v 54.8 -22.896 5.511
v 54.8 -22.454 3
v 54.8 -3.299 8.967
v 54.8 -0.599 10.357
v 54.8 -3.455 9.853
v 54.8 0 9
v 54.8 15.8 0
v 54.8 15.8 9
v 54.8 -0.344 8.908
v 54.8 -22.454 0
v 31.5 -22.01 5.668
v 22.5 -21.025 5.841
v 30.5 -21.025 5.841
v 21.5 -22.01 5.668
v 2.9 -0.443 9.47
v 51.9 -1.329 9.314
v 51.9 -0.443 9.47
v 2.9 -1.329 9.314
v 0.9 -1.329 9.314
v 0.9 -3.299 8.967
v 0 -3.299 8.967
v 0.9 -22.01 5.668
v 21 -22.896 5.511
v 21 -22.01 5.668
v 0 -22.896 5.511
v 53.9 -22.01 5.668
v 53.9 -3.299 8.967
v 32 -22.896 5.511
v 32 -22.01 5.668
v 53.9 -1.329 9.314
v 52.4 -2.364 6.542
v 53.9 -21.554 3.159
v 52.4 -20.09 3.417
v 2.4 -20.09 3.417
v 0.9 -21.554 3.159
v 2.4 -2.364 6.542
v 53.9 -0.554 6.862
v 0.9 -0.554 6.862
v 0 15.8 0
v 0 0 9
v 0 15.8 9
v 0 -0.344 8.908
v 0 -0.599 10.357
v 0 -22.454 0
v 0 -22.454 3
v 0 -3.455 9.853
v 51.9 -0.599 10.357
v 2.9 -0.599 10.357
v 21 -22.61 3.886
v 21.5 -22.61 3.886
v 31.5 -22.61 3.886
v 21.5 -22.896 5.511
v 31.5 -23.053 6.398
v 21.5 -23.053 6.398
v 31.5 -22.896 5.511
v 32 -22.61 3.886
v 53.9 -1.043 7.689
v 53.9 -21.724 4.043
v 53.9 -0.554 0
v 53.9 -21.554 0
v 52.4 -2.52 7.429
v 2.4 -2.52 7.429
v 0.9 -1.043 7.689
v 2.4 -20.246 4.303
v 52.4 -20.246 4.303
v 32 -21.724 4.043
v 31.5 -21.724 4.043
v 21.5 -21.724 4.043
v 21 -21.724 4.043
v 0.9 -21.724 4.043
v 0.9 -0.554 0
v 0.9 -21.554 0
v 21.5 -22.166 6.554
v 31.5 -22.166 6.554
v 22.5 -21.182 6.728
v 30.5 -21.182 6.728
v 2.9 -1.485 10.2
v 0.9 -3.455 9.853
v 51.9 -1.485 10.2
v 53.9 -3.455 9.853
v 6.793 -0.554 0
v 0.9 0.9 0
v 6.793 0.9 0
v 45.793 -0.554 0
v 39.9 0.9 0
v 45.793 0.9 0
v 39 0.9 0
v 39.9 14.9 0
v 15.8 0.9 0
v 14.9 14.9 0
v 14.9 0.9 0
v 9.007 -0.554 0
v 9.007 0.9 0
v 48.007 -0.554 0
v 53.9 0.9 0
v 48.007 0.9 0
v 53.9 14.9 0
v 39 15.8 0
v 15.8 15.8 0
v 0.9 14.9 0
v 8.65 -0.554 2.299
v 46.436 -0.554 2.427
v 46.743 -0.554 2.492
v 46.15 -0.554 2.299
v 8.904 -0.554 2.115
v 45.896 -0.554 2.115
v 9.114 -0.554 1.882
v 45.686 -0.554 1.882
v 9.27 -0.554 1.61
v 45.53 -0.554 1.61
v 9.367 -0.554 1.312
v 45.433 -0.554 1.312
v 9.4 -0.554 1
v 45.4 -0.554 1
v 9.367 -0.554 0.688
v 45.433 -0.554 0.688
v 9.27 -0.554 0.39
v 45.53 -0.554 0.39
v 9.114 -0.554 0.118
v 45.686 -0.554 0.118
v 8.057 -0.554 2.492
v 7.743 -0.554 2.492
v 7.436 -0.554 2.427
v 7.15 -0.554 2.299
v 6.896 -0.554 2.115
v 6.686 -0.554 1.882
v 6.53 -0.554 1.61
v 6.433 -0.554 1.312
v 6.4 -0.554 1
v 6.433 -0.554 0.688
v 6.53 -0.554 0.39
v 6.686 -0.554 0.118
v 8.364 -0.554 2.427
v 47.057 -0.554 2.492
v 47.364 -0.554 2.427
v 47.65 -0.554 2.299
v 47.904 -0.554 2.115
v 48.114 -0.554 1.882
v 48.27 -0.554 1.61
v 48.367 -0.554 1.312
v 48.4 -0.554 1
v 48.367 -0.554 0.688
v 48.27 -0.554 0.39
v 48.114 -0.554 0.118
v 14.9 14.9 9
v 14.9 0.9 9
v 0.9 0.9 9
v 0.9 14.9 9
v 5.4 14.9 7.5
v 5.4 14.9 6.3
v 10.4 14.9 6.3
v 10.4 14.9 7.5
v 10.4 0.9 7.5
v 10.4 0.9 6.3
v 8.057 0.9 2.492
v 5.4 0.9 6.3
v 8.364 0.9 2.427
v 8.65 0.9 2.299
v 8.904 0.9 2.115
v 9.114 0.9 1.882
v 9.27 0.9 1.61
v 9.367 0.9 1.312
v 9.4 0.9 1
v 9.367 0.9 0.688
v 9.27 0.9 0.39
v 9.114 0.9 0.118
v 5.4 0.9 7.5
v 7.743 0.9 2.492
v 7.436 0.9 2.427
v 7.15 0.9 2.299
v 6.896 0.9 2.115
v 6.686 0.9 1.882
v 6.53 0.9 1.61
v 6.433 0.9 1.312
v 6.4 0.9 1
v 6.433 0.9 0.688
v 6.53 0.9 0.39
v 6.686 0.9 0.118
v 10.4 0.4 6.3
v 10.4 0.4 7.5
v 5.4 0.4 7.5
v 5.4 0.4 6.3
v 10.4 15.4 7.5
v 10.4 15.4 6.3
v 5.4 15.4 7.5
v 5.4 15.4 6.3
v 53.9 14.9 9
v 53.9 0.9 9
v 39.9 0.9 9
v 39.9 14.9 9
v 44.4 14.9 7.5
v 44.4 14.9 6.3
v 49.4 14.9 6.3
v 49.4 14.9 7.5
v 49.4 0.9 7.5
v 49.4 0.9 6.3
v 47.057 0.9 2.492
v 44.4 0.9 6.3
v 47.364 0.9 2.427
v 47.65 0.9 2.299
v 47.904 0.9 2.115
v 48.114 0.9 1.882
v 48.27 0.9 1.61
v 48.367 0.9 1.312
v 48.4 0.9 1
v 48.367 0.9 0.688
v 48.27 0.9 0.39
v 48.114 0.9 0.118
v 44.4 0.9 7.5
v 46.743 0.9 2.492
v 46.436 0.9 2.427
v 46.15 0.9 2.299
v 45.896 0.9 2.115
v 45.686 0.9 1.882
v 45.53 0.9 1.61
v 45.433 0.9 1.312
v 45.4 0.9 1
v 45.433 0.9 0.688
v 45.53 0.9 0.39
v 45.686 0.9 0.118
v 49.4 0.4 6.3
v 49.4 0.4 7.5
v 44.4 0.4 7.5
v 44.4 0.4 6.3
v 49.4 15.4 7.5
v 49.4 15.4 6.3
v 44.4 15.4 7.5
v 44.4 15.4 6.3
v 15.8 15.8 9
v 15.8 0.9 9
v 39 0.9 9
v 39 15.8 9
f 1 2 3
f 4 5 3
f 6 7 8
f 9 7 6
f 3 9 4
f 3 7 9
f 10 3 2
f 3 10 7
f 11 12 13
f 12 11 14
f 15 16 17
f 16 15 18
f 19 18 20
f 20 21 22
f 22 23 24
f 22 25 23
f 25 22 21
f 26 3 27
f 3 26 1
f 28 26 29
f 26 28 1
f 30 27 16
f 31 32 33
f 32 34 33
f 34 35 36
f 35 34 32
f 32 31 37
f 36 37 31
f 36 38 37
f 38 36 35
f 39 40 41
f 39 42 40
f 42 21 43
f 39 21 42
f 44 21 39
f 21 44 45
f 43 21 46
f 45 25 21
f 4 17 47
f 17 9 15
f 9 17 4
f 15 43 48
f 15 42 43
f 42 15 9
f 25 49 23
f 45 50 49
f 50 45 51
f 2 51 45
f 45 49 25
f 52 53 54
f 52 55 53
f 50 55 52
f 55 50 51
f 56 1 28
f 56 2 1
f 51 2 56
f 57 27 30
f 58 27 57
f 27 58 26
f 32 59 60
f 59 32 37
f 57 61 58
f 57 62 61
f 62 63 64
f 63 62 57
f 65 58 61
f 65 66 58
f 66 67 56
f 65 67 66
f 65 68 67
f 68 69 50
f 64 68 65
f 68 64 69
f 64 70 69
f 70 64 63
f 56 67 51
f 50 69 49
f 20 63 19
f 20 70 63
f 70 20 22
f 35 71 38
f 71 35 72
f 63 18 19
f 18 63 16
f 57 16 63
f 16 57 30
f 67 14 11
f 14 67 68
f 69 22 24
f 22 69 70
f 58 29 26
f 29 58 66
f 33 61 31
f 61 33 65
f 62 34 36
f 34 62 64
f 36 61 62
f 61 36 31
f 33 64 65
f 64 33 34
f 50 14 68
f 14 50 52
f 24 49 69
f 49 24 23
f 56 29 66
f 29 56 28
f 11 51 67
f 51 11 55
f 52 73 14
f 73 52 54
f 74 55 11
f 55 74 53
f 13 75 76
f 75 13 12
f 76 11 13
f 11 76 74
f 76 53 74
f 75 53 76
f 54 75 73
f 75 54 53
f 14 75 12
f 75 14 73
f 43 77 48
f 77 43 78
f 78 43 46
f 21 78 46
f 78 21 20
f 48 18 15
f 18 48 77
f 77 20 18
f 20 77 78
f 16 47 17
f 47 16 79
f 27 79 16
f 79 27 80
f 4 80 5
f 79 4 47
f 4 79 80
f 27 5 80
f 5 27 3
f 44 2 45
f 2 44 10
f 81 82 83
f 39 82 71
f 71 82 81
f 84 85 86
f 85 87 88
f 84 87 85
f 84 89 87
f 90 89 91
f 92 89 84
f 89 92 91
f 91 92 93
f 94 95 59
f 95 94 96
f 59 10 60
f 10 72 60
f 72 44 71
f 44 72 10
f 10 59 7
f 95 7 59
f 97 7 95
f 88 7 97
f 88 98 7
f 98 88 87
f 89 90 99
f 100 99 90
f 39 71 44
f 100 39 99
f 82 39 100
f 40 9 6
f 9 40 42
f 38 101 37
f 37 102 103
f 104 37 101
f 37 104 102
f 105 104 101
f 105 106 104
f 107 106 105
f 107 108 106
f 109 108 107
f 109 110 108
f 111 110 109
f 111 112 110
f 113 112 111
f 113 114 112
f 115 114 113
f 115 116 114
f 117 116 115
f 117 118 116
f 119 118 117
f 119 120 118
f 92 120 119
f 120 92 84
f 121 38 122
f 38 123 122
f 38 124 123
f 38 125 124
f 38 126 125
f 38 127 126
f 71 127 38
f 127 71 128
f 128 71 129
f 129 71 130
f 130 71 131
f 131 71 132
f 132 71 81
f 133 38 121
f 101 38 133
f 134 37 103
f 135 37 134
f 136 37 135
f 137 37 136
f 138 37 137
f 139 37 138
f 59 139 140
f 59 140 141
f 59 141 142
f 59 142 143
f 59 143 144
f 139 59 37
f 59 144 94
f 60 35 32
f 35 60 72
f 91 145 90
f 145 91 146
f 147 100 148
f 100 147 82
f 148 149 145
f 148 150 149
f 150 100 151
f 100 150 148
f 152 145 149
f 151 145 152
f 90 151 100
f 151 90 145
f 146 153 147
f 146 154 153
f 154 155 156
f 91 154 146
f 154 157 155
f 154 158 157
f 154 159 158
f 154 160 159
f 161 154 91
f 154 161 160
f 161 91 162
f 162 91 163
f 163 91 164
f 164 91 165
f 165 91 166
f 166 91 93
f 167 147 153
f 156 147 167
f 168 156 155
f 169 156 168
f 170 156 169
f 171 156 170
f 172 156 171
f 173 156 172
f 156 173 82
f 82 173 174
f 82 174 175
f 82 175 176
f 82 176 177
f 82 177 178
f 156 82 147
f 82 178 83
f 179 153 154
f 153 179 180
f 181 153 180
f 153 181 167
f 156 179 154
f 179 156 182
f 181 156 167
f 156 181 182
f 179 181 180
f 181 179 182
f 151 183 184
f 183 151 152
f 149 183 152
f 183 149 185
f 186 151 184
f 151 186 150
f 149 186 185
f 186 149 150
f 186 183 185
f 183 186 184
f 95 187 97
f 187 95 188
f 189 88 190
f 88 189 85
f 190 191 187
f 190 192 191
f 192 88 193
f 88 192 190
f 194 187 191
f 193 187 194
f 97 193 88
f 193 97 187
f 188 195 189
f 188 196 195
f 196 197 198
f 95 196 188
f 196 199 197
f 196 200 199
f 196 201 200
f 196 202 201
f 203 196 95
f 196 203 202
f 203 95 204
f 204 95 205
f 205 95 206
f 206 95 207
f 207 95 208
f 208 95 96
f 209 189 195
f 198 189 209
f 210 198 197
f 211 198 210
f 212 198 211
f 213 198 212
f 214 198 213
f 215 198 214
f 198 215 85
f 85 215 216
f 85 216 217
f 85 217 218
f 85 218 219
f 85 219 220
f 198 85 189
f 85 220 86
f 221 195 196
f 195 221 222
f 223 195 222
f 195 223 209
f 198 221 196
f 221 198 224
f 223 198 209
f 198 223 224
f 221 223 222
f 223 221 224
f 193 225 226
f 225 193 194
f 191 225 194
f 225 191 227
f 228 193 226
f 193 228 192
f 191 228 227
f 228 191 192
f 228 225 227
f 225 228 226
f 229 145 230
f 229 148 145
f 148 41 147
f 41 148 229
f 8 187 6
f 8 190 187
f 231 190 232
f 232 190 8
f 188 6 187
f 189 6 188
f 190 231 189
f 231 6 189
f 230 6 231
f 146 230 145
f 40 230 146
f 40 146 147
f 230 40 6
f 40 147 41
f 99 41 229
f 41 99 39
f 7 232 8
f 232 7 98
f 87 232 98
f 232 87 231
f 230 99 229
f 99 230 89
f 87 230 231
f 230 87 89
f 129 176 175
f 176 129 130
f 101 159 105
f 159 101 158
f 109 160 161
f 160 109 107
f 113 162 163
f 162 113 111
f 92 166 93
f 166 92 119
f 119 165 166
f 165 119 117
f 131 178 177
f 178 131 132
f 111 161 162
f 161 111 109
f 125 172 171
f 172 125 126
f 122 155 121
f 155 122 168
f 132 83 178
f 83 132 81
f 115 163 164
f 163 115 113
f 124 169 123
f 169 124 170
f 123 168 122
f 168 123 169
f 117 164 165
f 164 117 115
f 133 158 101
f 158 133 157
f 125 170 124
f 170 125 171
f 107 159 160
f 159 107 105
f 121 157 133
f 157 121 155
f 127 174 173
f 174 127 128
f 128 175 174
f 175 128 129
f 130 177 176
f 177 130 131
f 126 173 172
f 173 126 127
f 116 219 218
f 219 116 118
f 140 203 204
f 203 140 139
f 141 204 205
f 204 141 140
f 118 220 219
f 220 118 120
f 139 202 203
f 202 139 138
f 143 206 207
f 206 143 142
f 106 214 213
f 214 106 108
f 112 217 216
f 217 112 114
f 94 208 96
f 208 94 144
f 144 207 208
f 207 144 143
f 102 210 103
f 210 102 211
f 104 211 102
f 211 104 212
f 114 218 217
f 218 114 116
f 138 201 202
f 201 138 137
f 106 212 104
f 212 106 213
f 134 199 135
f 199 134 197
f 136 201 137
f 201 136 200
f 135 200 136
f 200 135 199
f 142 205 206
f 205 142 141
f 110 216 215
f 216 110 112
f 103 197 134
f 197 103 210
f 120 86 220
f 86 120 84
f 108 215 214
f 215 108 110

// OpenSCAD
plate_thickness=1.5; // From official Cherry MX spec
switch_width=14;
height=9;
switch_extra_space=[5, 0.5, 1.2];

thickness=0.9;
gap=25; // 5;

bluepill=[53, 21, 1.65];

c=bluepill[1]+thickness*2;

bluepill_z_offset=3;
bluepill_y_offset=cos(10)*(bluepill[1]+thickness*2);

main();
//bottom();

module bottom() {
    difference() {
        translate([0, -bluepill_y_offset, 0])
            cube([thickness*2+gap+switch_width*2,  thickness*2 +switch_width + bluepill_y_offset, thickness]);
        translate([thickness*2+switch_width, thickness, 0])
            cube([gap-thickness*2, switch_width+thickness, thickness]);
    }

    translate([0, 0, thickness]) {
        translate([thickness, thickness]) xxcube([switch_width, switch_width, 2]);
        translate([thickness+switch_width+gap, thickness]) xxcube([switch_width, switch_width, 2]);
        translate([thickness, -bluepill_y_offset+thickness, 0]) xxcube([bluepill[0], bluepill[1], 2]);
    }
}

module xxcube(s) difference() {
    cube(s);
    translate([thickness, thickness]) cube(s-[thickness*2, thickness*2, 0]);
    translate([thickness*2*2, 0]) cube(s-[thickness*4*2, 0, 0]);
    translate([0, thickness*2*2]) cube(s-[0, thickness*4*2, 0]);
}

module main() difference() {
    union() {
        translate([0, -bluepill_y_offset, bluepill_z_offset]) rotate([10, 0, 0]) bluepill_case();

        difference() {
            mirror([1, 0]) rotate([90, 0]) rotate([0, -90]) linear_extrude(height=thickness*2+bluepill[0])
                polygon([[0, 0], [0, height], [bluepill_y_offset, bluepill_z_offset], [bluepill_y_offset, 0]]);
            translate([thickness, -bluepill_y_offset+thickness, 0]) cube(bluepill+[0, 0, 99]);
        }

        switch_case();
    }
    // wire hole
    translate([thickness+switch_width/2, 0, 1]) rotate([90, 0])
        cylinder(h=thickness*2+0.00001, d=3, center=true, $fn=30);
    translate([thickness+switch_width*1.5+gap, 0, 1]) rotate([90, 0])
        cylinder(h=thickness*2+0.00001, d=3, center=true, $fn=30);
}


module bluepill_case() {
    x=2;
    space=0.5;
    difference() {
        cube(bluepill+[thickness*2, thickness*2, thickness]);
        translate([thickness, thickness, thickness]) cube(bluepill);
        translate([thickness+1.5, thickness+1.5, 0])
            cube([bluepill[0]-1.5*2, bluepill[1]-1.5*2, thickness]);
        translate([bluepill[0]/2-10/2-space, 0, thickness]) cube([space, thickness, bluepill[2]]);
        translate([bluepill[0]/2+10/2, 0, thickness]) cube([space, thickness, bluepill[2]]);
    }
    translate([bluepill[0]/2-10/2, 0, thickness+bluepill[2]])
        hull() {
            cube([10, thickness, thickness]);
            translate([1, 0, 0]) cube([8, thickness+1, thickness]);
        }
    translate([0, thickness+bluepill[1]-x, thickness+bluepill[2]])
       hull() {
           cube([thickness, thickness+x, thickness]);
           translate([0, x, 0]) cube([x+thickness, thickness, thickness]);
       }
    translate([bluepill[0]+thickness-x, thickness+bluepill[1]-x, thickness+bluepill[2]])
       hull() {
           translate([x, 0, 0]) cube([thickness, thickness+x, thickness]);
           translate([0, x, 0]) cube([x+thickness, thickness, thickness]);
       }
}

module switch_case() {
    difference() {
        cube([thickness*2+25+switch_width*2, thickness*2+switch_width, height]);
                
        translate([thickness, thickness, 0]) switch_void();
        translate([25+switch_width+thickness, thickness, 0]) switch_void();
        translate([switch_width+thickness*2, thickness, 0])
            cube([25-thickness*2, switch_width+thickness, height]);
    }

    //cube([25+switch_width, thickness, height]);
    //translate([0, switch_width+switch_extra_space*2+thickness, 0]) cube([25+switch_width, thickness, height]);

    module switch_void() {
        cube([switch_width, switch_width, 10]);
        translate([(switch_width-switch_extra_space[0])/2, -switch_extra_space[1], height-plate_thickness-switch_extra_space[2]])
            cube(switch_extra_space);
        translate([(switch_width-switch_extra_space[0])/2, switch_width, height-plate_thickness-switch_extra_space[2]])
            cube(switch_extra_space);
    }
}
